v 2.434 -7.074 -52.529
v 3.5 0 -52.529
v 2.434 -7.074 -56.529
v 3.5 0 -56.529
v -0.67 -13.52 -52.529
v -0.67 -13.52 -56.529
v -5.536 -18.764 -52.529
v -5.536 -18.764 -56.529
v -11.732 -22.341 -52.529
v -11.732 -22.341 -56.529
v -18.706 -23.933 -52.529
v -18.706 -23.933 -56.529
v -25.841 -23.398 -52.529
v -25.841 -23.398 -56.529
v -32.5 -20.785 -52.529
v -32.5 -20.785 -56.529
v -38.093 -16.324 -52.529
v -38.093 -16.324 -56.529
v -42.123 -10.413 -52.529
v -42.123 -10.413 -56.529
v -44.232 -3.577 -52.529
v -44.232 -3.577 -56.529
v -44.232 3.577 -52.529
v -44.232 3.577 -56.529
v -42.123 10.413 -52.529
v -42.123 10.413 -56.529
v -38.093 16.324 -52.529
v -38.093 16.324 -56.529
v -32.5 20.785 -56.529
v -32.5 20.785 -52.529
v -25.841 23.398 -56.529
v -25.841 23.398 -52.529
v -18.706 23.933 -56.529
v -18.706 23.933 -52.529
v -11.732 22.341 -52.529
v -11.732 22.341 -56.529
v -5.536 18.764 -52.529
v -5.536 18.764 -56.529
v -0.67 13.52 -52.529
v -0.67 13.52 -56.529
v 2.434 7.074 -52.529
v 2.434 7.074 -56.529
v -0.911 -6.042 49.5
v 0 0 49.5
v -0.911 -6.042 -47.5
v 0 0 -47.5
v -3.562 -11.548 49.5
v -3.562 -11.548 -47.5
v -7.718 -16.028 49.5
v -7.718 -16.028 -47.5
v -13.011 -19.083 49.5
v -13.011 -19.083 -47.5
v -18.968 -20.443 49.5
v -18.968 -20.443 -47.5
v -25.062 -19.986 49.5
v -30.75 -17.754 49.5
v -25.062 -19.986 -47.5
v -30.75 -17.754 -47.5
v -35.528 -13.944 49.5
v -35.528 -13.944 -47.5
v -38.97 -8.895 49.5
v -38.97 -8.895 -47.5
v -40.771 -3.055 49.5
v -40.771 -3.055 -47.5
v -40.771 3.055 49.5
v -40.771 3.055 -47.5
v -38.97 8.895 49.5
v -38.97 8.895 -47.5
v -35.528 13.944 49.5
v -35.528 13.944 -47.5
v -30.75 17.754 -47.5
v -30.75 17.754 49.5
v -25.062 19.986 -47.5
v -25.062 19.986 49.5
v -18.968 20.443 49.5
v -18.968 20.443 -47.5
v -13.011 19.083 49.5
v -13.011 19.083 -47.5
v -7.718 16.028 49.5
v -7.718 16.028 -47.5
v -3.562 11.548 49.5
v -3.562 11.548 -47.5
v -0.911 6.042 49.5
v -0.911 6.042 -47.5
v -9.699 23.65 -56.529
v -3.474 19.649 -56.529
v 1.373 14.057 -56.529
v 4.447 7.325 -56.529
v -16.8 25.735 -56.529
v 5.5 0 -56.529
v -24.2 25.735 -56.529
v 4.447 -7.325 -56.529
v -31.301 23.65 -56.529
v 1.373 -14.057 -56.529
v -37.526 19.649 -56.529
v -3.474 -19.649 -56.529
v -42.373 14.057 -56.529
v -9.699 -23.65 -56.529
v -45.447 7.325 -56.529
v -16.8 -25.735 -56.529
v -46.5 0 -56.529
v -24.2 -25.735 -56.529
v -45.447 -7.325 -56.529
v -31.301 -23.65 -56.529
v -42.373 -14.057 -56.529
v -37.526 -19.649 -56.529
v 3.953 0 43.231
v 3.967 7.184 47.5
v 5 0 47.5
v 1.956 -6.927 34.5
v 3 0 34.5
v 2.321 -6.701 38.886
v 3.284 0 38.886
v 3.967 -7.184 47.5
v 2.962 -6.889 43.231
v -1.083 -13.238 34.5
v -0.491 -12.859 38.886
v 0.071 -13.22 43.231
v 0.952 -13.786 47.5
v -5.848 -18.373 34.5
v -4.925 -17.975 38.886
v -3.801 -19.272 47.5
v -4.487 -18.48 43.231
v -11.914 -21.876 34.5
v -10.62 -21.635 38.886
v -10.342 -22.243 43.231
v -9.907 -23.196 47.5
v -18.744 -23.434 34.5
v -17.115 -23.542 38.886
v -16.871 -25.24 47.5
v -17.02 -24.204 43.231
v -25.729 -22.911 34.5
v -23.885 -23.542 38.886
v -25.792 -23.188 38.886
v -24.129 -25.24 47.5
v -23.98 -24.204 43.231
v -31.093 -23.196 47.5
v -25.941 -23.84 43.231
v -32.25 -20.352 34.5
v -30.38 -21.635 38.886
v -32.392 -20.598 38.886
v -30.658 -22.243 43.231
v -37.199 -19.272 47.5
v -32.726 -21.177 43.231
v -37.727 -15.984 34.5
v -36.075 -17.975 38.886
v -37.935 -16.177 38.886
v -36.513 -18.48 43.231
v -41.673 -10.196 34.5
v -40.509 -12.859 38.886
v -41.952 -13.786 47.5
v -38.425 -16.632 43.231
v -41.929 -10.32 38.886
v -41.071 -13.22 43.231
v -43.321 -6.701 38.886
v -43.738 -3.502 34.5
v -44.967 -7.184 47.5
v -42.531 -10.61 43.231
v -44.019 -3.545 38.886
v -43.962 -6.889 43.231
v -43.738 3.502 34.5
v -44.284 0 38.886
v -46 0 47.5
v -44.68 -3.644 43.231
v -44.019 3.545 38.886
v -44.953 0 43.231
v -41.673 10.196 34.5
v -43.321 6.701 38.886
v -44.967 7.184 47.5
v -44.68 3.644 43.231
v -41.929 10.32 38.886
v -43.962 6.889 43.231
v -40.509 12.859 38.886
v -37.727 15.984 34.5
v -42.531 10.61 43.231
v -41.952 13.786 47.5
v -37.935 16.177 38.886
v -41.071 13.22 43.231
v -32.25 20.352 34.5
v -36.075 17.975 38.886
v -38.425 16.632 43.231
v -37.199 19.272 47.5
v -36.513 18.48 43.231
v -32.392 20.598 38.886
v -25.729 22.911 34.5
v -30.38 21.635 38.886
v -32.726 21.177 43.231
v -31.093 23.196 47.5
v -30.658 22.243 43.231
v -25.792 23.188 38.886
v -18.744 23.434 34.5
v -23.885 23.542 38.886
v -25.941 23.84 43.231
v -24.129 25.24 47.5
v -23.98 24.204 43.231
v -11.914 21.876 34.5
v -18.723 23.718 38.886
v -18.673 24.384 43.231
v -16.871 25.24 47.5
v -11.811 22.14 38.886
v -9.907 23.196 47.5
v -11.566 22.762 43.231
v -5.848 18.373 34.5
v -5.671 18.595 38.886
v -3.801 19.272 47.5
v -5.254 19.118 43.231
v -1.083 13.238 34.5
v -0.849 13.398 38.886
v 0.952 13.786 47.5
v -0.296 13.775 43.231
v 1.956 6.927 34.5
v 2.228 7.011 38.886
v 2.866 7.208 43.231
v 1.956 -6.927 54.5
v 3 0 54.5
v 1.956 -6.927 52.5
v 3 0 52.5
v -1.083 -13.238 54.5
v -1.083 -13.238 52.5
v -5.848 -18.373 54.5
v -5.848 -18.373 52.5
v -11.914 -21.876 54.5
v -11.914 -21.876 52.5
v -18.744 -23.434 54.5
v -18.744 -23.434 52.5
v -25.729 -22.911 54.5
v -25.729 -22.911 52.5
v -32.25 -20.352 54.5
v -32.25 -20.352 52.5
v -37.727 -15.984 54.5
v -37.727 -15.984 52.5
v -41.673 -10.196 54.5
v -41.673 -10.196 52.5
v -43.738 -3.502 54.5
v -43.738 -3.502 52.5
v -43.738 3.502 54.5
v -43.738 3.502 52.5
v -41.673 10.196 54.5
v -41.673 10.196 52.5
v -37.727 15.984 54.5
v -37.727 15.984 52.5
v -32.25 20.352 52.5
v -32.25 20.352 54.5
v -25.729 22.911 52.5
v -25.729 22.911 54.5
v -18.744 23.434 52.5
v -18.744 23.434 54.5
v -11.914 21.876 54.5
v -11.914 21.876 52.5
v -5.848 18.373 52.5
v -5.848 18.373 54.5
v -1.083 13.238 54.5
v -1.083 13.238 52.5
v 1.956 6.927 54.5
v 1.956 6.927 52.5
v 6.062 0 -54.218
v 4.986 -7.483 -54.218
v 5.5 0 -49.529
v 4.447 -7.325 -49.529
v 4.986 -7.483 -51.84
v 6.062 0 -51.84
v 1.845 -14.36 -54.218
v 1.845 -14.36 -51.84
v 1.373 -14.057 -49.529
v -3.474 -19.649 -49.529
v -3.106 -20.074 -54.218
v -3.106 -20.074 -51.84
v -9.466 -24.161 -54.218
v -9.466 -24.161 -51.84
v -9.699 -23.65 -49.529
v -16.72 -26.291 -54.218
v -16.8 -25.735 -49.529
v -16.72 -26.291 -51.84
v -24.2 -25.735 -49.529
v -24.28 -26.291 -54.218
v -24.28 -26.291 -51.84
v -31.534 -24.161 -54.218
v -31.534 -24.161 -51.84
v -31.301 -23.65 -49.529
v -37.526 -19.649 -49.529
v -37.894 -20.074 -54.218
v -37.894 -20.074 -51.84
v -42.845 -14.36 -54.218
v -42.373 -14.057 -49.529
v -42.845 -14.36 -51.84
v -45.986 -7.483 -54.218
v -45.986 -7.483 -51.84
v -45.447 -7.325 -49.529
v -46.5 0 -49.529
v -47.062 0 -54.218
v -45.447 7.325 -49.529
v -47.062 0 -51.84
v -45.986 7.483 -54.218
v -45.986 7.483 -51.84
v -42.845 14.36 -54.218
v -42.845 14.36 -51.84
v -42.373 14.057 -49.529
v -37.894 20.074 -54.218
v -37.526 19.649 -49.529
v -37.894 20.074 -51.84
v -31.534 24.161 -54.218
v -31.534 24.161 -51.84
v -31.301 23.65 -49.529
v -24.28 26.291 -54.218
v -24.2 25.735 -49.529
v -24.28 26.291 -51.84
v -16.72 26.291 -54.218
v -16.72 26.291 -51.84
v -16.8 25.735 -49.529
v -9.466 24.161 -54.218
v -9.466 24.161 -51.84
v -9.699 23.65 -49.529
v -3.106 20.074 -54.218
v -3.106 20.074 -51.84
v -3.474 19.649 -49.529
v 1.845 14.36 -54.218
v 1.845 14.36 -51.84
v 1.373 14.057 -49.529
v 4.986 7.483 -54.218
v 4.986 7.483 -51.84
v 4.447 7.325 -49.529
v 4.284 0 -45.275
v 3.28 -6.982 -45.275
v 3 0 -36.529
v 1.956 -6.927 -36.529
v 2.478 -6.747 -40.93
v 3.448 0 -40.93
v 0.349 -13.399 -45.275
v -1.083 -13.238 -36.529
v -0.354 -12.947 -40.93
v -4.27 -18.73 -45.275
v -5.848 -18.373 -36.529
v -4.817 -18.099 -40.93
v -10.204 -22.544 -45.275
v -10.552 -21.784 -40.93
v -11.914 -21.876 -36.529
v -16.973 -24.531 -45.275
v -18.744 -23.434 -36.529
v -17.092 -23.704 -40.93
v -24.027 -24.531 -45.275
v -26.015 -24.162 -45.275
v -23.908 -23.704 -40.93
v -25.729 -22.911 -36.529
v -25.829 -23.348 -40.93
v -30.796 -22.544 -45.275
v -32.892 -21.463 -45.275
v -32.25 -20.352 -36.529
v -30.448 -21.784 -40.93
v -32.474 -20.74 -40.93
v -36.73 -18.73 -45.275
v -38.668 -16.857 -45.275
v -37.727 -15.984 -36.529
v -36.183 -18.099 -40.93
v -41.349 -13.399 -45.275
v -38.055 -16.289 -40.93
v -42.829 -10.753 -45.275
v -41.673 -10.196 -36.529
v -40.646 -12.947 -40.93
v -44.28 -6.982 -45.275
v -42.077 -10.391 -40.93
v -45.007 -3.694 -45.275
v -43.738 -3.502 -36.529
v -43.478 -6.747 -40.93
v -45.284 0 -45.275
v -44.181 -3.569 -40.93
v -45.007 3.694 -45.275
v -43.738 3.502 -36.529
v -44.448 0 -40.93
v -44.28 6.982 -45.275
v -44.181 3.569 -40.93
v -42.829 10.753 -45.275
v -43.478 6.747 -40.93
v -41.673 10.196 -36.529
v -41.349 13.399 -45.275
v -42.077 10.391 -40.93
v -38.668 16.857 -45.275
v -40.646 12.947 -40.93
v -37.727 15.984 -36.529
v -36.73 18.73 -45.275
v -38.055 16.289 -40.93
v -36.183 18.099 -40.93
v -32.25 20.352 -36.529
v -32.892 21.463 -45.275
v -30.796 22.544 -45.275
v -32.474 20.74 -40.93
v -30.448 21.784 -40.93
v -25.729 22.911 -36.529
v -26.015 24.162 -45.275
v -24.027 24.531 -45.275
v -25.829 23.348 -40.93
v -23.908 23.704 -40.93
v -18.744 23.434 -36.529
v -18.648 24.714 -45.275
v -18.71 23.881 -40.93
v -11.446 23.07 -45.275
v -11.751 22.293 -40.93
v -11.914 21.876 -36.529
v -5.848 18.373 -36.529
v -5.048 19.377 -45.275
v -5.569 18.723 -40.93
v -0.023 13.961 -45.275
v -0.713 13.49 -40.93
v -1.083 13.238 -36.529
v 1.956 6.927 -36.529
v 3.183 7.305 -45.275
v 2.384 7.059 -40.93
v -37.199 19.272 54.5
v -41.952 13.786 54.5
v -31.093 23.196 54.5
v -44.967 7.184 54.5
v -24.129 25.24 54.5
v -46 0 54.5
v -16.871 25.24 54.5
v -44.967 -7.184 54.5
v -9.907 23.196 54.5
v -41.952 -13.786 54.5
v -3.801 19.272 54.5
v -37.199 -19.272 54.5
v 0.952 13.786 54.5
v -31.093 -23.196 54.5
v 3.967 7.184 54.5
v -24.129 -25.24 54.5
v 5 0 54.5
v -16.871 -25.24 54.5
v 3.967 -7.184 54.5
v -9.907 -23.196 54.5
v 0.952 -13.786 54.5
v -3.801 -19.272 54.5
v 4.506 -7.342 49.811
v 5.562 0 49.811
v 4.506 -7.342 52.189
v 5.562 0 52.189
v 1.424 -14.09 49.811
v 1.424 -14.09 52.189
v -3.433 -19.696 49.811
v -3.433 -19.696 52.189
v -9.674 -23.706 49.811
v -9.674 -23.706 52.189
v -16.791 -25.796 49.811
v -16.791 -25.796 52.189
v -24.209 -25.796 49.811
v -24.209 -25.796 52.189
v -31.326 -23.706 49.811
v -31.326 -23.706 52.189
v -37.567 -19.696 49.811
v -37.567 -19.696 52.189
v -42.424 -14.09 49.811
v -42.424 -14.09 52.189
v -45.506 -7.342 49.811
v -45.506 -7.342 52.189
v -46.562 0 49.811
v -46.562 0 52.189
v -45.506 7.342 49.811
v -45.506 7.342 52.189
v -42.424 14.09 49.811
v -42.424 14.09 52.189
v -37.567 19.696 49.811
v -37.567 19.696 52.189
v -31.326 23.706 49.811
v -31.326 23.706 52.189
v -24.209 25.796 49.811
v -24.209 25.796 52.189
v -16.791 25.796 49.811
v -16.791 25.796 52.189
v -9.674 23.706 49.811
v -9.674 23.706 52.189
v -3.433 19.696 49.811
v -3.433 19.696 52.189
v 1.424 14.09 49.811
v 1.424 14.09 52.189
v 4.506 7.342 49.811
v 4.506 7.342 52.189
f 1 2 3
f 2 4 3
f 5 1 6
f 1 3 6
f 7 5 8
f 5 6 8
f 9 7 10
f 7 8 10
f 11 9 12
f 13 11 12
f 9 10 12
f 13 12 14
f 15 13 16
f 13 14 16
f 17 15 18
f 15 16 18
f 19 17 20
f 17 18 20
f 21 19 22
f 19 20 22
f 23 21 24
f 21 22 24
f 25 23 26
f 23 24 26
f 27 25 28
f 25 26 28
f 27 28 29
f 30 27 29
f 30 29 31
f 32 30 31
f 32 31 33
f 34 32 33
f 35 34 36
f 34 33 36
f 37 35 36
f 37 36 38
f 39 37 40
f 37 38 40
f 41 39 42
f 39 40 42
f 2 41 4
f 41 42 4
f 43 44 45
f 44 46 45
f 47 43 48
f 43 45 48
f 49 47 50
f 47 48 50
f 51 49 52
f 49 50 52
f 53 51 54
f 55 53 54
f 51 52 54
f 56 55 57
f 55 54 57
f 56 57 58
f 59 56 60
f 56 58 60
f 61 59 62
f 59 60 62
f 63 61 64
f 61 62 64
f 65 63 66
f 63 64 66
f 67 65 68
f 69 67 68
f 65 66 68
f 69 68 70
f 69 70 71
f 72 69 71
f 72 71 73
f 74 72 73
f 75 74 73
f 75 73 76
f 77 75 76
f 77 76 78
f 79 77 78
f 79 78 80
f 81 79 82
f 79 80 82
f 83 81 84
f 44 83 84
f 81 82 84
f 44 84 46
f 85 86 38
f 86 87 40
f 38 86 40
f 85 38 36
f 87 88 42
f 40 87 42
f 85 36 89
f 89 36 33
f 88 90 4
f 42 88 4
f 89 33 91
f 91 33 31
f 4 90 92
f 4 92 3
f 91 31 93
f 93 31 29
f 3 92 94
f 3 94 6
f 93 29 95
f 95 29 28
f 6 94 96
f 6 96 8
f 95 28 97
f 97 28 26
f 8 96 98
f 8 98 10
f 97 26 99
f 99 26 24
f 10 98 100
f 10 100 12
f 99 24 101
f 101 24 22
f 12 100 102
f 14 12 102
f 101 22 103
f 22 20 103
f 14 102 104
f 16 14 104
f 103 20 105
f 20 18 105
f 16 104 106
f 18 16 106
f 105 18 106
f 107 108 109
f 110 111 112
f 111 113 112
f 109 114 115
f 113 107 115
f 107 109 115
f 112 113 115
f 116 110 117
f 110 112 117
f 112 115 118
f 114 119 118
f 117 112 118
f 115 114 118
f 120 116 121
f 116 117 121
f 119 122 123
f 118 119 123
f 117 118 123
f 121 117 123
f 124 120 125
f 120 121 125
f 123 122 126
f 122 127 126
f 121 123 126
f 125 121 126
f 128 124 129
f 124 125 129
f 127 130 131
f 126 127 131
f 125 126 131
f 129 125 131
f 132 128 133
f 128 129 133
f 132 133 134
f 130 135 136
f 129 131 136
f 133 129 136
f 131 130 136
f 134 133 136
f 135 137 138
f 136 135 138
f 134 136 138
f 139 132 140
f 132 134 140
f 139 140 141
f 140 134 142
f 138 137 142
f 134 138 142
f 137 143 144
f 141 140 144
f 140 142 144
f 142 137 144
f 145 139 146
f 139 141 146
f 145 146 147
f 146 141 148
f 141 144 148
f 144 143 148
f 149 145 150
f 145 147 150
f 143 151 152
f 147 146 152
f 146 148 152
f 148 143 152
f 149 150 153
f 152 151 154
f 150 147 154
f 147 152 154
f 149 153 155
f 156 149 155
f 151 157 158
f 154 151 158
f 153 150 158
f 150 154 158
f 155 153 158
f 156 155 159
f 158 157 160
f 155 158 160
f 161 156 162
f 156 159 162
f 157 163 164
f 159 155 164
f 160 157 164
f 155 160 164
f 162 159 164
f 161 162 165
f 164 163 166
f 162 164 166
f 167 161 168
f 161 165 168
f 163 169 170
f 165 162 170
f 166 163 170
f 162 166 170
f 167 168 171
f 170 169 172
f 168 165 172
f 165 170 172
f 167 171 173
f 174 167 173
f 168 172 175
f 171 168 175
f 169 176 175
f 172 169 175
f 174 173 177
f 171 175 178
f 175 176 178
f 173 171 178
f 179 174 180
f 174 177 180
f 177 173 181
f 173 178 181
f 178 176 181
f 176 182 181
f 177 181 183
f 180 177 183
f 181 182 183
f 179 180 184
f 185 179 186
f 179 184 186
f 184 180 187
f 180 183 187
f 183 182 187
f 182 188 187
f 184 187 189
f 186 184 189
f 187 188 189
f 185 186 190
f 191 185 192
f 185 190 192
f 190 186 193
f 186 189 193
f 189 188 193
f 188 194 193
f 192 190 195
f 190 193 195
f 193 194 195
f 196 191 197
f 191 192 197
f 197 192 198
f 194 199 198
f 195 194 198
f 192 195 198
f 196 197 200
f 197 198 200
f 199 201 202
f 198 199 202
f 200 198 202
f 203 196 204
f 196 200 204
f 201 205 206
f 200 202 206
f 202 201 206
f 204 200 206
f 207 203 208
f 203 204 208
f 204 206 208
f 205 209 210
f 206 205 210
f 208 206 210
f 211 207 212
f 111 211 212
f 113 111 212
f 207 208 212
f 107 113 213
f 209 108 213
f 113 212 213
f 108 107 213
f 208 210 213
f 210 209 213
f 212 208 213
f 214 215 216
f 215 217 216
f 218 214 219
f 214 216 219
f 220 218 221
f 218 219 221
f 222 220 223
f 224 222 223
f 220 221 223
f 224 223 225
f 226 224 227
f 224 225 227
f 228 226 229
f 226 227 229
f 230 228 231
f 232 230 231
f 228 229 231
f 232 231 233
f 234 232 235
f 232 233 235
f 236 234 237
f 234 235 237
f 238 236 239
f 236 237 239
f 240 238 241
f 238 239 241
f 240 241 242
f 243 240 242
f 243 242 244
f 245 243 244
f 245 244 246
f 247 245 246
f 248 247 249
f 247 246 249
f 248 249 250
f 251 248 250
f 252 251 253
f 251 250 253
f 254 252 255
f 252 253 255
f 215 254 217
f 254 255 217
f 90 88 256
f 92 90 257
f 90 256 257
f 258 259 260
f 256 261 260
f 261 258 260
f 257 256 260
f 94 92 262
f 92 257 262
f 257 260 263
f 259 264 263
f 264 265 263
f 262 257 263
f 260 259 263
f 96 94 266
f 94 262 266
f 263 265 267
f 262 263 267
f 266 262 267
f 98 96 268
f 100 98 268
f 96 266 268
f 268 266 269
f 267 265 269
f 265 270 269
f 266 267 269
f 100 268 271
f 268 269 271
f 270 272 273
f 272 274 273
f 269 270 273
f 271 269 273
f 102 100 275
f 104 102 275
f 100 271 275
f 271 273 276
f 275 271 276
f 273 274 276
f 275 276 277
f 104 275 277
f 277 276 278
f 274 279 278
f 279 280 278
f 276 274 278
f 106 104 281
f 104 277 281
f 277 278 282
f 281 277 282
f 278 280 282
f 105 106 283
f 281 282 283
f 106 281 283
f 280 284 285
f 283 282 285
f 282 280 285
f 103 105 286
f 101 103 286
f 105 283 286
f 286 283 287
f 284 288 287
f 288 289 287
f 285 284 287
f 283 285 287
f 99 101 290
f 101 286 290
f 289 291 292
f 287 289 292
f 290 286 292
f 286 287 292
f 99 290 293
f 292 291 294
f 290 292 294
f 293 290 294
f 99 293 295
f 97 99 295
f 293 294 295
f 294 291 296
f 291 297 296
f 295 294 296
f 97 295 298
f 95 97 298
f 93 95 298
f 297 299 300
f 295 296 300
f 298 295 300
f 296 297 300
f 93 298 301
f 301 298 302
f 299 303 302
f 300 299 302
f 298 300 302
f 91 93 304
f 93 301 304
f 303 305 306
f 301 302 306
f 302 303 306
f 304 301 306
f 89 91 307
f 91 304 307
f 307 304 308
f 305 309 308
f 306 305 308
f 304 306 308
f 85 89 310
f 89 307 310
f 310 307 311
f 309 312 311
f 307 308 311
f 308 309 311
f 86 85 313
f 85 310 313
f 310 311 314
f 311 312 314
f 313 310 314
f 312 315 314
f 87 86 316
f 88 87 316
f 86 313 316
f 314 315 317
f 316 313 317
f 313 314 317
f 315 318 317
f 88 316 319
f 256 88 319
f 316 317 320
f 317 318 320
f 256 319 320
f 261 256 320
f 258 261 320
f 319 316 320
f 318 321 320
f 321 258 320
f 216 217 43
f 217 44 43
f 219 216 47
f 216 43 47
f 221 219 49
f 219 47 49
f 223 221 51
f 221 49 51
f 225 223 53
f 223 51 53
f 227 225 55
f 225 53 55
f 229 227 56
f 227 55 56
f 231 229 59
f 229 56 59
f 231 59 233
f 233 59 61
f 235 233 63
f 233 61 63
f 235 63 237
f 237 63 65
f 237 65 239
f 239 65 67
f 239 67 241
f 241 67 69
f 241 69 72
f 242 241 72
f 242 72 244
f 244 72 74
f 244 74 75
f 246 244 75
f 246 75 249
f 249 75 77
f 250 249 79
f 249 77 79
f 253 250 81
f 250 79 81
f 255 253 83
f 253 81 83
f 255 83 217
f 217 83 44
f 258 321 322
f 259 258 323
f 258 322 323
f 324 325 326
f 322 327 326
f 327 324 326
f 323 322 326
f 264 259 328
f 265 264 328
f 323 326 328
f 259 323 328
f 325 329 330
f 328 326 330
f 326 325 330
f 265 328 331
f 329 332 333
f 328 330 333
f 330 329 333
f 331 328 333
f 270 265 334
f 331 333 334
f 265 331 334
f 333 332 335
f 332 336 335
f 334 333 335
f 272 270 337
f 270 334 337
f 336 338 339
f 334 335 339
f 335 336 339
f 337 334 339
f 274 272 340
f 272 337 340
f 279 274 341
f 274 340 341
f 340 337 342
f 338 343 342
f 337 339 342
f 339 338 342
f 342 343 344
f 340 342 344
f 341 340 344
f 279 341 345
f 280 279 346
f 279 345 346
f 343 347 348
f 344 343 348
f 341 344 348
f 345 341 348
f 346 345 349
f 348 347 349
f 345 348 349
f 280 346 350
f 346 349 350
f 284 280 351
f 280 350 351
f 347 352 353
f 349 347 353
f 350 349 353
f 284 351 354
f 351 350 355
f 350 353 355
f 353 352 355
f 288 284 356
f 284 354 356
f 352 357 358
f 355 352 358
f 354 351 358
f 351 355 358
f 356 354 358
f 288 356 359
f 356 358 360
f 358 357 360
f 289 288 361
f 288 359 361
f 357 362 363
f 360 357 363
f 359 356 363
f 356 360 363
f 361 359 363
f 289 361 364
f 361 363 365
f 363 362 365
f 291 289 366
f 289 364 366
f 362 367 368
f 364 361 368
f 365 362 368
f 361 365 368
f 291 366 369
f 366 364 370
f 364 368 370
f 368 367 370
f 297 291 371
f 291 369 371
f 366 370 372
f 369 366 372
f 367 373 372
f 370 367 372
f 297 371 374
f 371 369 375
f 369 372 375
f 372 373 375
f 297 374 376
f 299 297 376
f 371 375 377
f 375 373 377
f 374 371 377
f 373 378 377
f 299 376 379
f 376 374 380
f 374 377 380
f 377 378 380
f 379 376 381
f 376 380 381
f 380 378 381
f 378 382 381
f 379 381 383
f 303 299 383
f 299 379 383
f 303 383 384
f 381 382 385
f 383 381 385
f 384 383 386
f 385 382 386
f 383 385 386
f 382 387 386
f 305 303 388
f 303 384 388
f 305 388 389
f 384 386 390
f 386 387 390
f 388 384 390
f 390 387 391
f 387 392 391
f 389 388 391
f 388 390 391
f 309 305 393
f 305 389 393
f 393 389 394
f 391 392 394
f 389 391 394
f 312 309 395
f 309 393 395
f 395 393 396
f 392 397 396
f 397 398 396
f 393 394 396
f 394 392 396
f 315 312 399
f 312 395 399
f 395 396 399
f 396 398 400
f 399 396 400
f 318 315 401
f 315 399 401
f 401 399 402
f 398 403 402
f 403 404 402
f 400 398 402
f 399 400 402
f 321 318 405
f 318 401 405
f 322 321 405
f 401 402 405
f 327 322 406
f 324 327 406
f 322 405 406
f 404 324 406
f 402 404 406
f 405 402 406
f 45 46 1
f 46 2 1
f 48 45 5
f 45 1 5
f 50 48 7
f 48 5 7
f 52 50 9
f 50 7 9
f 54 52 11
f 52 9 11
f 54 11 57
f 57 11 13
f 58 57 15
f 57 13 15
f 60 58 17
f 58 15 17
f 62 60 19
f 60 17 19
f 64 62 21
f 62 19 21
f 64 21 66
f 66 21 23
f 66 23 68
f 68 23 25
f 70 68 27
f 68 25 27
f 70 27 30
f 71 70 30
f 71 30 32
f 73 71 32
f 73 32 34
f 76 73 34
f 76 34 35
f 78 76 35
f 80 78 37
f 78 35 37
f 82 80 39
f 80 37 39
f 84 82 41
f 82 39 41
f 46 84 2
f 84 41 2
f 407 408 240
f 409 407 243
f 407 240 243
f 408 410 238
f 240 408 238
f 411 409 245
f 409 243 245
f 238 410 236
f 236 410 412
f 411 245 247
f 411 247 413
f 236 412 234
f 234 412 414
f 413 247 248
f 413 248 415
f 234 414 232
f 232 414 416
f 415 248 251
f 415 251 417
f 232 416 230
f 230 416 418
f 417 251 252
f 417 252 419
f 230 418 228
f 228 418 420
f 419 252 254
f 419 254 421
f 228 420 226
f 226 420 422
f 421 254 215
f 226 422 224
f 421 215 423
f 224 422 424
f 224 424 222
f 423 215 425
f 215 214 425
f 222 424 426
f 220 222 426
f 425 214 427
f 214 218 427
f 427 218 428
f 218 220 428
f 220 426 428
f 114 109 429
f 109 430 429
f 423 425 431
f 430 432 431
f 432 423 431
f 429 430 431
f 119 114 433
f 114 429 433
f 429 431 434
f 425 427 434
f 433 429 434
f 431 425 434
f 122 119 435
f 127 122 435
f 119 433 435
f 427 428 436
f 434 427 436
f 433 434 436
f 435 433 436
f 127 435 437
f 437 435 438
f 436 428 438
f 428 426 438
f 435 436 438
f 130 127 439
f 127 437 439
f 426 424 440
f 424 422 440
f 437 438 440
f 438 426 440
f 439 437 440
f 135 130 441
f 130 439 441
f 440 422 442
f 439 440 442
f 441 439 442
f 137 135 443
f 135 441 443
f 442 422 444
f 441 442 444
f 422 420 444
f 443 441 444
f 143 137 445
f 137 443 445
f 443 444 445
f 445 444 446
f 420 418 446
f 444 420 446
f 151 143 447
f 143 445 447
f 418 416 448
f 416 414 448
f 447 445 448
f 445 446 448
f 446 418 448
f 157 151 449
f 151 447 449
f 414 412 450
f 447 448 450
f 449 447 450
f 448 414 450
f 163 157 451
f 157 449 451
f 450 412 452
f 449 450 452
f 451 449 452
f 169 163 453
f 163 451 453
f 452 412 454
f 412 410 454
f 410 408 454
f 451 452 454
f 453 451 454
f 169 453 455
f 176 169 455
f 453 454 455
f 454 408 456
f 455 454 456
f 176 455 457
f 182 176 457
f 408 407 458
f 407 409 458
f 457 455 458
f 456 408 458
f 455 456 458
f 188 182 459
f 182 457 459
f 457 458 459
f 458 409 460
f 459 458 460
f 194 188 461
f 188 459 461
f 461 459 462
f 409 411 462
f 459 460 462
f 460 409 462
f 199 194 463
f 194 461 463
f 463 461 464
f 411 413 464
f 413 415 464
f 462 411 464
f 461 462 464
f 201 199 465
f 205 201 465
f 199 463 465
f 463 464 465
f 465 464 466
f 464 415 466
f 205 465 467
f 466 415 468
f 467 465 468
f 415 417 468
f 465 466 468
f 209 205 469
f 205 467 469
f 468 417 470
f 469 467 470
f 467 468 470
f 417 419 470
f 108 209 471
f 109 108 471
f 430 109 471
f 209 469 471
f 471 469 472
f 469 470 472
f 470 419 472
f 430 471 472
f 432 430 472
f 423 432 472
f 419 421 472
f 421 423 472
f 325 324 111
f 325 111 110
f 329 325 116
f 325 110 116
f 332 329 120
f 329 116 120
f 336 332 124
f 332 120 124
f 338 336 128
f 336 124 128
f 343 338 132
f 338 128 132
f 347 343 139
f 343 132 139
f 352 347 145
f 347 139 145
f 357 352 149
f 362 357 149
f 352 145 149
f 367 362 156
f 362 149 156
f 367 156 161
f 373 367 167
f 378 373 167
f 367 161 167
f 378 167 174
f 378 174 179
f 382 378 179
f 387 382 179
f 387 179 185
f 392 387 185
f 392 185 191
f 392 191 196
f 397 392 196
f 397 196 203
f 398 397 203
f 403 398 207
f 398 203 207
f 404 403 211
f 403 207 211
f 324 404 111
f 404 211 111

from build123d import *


with BuildPart() as f1:
    # F0 (on Front) → F1 (revolve)
    with BuildSketch(Plane.XZ):
        with BuildLine():
            Line((0, 49.5), (0, 0))
            Line((0, 0), (0, -47.5))
            Line((0, -47.5), (3.5, -52.52894))
            Line((3.5, -52.52894), (3.5, -56.52894))
            Line((3.5, -56.52894), (5.5, -56.52894))
            ThreePointArc((5.5, -56.52894), (6.132503, -53.02894), (5.5, -49.52894))
            ThreePointArc((5.5, -49.52894), (3.817857, -43.112045), (3, -36.52894))
            Line((3, -36.52894), (3, 0))
            Line((3, 0), (3, 34.5))
            ThreePointArc((3, 34.5), (3.570664, 41.066052), (5, 47.5))
            ThreePointArc((5, 47.5), (5.632503, 51), (5, 54.5))
            Line((5, 54.5), (3, 54.5))
            Line((3, 54.5), (3, 52.5))
            Line((3, 52.5), (0, 49.5))
        make_face()
    revolve(axis=Axis((-20.5, 0, 1.066906), (0, 0, -1)))


solid = f1.part
